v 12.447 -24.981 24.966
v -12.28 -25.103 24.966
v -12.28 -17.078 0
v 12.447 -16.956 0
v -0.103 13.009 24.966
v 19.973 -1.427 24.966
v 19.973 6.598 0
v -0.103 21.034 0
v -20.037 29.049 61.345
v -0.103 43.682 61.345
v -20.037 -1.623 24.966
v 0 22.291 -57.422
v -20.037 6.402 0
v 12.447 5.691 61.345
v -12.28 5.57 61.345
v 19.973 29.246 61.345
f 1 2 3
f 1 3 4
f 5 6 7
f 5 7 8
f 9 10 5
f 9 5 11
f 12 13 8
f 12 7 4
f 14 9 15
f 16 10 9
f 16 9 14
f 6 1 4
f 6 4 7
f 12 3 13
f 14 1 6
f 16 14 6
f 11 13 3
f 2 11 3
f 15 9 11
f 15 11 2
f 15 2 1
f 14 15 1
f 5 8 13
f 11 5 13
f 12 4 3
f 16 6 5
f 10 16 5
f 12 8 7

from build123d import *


with BuildPart() as f2:
    # F2: sweep along a path in F1
    with BuildLine(Plane.YZ) as f2_path:
        Line((0, 0), (-8.0247949809, 24.9660369009))
    # F0 (on Top) → F2 (sweep)
    with BuildSketch(Plane.XY):
        Polygon((-0.1032873551, 21.0342315395), (-20.0366605189, 6.4017028972), (-12.2800498667, -17.0777615631), (12.4471723178, -16.956339995), (19.9728254229, 6.5981671214), align=None)
    sweep(path=f2_path.line)

    # F3: sweep along a path in F1
    with BuildLine(Plane.YZ) as f3_path:
        Line((-8.0247949809, 24.9660369009), (22.6477645338, 61.3451190293))
    # F2_face (on face) → F3 (sweep)
    with BuildSketch(Plane(origin=(0, -8.0247949809, 24.9660369009), x_dir=(1, 0, 0), z_dir=(0, 0, 1))):
        Polygon((12.4471723178, -16.956339995), (19.9728254229, 6.5981671214), (-0.1032873551, 21.0342315395), (-20.0366605189, 6.4017028972), (-12.2800498667, -17.0777615631), align=None)
    sweep(path=f3_path.line)

    # F2_face1 (on face) → F4 section 0
    with BuildSketch(Plane(origin=(0, 0, 0), x_dir=(1, 0, 0), z_dir=(0, 0, -1)), mode=Mode.PRIVATE) as f4_s0:
        Polygon((19.9728254229, -6.5981671214), (12.4471723178, 16.956339995), (-12.2800498667, 17.0777615631), (-20.0366605189, -6.4017028972), (-0.1032873551, -21.0342315395), align=None)
    loft([f4_s0.sketch, Vertex(0, 22.2911071032, -57.4218854308)])


solid = f2.part
